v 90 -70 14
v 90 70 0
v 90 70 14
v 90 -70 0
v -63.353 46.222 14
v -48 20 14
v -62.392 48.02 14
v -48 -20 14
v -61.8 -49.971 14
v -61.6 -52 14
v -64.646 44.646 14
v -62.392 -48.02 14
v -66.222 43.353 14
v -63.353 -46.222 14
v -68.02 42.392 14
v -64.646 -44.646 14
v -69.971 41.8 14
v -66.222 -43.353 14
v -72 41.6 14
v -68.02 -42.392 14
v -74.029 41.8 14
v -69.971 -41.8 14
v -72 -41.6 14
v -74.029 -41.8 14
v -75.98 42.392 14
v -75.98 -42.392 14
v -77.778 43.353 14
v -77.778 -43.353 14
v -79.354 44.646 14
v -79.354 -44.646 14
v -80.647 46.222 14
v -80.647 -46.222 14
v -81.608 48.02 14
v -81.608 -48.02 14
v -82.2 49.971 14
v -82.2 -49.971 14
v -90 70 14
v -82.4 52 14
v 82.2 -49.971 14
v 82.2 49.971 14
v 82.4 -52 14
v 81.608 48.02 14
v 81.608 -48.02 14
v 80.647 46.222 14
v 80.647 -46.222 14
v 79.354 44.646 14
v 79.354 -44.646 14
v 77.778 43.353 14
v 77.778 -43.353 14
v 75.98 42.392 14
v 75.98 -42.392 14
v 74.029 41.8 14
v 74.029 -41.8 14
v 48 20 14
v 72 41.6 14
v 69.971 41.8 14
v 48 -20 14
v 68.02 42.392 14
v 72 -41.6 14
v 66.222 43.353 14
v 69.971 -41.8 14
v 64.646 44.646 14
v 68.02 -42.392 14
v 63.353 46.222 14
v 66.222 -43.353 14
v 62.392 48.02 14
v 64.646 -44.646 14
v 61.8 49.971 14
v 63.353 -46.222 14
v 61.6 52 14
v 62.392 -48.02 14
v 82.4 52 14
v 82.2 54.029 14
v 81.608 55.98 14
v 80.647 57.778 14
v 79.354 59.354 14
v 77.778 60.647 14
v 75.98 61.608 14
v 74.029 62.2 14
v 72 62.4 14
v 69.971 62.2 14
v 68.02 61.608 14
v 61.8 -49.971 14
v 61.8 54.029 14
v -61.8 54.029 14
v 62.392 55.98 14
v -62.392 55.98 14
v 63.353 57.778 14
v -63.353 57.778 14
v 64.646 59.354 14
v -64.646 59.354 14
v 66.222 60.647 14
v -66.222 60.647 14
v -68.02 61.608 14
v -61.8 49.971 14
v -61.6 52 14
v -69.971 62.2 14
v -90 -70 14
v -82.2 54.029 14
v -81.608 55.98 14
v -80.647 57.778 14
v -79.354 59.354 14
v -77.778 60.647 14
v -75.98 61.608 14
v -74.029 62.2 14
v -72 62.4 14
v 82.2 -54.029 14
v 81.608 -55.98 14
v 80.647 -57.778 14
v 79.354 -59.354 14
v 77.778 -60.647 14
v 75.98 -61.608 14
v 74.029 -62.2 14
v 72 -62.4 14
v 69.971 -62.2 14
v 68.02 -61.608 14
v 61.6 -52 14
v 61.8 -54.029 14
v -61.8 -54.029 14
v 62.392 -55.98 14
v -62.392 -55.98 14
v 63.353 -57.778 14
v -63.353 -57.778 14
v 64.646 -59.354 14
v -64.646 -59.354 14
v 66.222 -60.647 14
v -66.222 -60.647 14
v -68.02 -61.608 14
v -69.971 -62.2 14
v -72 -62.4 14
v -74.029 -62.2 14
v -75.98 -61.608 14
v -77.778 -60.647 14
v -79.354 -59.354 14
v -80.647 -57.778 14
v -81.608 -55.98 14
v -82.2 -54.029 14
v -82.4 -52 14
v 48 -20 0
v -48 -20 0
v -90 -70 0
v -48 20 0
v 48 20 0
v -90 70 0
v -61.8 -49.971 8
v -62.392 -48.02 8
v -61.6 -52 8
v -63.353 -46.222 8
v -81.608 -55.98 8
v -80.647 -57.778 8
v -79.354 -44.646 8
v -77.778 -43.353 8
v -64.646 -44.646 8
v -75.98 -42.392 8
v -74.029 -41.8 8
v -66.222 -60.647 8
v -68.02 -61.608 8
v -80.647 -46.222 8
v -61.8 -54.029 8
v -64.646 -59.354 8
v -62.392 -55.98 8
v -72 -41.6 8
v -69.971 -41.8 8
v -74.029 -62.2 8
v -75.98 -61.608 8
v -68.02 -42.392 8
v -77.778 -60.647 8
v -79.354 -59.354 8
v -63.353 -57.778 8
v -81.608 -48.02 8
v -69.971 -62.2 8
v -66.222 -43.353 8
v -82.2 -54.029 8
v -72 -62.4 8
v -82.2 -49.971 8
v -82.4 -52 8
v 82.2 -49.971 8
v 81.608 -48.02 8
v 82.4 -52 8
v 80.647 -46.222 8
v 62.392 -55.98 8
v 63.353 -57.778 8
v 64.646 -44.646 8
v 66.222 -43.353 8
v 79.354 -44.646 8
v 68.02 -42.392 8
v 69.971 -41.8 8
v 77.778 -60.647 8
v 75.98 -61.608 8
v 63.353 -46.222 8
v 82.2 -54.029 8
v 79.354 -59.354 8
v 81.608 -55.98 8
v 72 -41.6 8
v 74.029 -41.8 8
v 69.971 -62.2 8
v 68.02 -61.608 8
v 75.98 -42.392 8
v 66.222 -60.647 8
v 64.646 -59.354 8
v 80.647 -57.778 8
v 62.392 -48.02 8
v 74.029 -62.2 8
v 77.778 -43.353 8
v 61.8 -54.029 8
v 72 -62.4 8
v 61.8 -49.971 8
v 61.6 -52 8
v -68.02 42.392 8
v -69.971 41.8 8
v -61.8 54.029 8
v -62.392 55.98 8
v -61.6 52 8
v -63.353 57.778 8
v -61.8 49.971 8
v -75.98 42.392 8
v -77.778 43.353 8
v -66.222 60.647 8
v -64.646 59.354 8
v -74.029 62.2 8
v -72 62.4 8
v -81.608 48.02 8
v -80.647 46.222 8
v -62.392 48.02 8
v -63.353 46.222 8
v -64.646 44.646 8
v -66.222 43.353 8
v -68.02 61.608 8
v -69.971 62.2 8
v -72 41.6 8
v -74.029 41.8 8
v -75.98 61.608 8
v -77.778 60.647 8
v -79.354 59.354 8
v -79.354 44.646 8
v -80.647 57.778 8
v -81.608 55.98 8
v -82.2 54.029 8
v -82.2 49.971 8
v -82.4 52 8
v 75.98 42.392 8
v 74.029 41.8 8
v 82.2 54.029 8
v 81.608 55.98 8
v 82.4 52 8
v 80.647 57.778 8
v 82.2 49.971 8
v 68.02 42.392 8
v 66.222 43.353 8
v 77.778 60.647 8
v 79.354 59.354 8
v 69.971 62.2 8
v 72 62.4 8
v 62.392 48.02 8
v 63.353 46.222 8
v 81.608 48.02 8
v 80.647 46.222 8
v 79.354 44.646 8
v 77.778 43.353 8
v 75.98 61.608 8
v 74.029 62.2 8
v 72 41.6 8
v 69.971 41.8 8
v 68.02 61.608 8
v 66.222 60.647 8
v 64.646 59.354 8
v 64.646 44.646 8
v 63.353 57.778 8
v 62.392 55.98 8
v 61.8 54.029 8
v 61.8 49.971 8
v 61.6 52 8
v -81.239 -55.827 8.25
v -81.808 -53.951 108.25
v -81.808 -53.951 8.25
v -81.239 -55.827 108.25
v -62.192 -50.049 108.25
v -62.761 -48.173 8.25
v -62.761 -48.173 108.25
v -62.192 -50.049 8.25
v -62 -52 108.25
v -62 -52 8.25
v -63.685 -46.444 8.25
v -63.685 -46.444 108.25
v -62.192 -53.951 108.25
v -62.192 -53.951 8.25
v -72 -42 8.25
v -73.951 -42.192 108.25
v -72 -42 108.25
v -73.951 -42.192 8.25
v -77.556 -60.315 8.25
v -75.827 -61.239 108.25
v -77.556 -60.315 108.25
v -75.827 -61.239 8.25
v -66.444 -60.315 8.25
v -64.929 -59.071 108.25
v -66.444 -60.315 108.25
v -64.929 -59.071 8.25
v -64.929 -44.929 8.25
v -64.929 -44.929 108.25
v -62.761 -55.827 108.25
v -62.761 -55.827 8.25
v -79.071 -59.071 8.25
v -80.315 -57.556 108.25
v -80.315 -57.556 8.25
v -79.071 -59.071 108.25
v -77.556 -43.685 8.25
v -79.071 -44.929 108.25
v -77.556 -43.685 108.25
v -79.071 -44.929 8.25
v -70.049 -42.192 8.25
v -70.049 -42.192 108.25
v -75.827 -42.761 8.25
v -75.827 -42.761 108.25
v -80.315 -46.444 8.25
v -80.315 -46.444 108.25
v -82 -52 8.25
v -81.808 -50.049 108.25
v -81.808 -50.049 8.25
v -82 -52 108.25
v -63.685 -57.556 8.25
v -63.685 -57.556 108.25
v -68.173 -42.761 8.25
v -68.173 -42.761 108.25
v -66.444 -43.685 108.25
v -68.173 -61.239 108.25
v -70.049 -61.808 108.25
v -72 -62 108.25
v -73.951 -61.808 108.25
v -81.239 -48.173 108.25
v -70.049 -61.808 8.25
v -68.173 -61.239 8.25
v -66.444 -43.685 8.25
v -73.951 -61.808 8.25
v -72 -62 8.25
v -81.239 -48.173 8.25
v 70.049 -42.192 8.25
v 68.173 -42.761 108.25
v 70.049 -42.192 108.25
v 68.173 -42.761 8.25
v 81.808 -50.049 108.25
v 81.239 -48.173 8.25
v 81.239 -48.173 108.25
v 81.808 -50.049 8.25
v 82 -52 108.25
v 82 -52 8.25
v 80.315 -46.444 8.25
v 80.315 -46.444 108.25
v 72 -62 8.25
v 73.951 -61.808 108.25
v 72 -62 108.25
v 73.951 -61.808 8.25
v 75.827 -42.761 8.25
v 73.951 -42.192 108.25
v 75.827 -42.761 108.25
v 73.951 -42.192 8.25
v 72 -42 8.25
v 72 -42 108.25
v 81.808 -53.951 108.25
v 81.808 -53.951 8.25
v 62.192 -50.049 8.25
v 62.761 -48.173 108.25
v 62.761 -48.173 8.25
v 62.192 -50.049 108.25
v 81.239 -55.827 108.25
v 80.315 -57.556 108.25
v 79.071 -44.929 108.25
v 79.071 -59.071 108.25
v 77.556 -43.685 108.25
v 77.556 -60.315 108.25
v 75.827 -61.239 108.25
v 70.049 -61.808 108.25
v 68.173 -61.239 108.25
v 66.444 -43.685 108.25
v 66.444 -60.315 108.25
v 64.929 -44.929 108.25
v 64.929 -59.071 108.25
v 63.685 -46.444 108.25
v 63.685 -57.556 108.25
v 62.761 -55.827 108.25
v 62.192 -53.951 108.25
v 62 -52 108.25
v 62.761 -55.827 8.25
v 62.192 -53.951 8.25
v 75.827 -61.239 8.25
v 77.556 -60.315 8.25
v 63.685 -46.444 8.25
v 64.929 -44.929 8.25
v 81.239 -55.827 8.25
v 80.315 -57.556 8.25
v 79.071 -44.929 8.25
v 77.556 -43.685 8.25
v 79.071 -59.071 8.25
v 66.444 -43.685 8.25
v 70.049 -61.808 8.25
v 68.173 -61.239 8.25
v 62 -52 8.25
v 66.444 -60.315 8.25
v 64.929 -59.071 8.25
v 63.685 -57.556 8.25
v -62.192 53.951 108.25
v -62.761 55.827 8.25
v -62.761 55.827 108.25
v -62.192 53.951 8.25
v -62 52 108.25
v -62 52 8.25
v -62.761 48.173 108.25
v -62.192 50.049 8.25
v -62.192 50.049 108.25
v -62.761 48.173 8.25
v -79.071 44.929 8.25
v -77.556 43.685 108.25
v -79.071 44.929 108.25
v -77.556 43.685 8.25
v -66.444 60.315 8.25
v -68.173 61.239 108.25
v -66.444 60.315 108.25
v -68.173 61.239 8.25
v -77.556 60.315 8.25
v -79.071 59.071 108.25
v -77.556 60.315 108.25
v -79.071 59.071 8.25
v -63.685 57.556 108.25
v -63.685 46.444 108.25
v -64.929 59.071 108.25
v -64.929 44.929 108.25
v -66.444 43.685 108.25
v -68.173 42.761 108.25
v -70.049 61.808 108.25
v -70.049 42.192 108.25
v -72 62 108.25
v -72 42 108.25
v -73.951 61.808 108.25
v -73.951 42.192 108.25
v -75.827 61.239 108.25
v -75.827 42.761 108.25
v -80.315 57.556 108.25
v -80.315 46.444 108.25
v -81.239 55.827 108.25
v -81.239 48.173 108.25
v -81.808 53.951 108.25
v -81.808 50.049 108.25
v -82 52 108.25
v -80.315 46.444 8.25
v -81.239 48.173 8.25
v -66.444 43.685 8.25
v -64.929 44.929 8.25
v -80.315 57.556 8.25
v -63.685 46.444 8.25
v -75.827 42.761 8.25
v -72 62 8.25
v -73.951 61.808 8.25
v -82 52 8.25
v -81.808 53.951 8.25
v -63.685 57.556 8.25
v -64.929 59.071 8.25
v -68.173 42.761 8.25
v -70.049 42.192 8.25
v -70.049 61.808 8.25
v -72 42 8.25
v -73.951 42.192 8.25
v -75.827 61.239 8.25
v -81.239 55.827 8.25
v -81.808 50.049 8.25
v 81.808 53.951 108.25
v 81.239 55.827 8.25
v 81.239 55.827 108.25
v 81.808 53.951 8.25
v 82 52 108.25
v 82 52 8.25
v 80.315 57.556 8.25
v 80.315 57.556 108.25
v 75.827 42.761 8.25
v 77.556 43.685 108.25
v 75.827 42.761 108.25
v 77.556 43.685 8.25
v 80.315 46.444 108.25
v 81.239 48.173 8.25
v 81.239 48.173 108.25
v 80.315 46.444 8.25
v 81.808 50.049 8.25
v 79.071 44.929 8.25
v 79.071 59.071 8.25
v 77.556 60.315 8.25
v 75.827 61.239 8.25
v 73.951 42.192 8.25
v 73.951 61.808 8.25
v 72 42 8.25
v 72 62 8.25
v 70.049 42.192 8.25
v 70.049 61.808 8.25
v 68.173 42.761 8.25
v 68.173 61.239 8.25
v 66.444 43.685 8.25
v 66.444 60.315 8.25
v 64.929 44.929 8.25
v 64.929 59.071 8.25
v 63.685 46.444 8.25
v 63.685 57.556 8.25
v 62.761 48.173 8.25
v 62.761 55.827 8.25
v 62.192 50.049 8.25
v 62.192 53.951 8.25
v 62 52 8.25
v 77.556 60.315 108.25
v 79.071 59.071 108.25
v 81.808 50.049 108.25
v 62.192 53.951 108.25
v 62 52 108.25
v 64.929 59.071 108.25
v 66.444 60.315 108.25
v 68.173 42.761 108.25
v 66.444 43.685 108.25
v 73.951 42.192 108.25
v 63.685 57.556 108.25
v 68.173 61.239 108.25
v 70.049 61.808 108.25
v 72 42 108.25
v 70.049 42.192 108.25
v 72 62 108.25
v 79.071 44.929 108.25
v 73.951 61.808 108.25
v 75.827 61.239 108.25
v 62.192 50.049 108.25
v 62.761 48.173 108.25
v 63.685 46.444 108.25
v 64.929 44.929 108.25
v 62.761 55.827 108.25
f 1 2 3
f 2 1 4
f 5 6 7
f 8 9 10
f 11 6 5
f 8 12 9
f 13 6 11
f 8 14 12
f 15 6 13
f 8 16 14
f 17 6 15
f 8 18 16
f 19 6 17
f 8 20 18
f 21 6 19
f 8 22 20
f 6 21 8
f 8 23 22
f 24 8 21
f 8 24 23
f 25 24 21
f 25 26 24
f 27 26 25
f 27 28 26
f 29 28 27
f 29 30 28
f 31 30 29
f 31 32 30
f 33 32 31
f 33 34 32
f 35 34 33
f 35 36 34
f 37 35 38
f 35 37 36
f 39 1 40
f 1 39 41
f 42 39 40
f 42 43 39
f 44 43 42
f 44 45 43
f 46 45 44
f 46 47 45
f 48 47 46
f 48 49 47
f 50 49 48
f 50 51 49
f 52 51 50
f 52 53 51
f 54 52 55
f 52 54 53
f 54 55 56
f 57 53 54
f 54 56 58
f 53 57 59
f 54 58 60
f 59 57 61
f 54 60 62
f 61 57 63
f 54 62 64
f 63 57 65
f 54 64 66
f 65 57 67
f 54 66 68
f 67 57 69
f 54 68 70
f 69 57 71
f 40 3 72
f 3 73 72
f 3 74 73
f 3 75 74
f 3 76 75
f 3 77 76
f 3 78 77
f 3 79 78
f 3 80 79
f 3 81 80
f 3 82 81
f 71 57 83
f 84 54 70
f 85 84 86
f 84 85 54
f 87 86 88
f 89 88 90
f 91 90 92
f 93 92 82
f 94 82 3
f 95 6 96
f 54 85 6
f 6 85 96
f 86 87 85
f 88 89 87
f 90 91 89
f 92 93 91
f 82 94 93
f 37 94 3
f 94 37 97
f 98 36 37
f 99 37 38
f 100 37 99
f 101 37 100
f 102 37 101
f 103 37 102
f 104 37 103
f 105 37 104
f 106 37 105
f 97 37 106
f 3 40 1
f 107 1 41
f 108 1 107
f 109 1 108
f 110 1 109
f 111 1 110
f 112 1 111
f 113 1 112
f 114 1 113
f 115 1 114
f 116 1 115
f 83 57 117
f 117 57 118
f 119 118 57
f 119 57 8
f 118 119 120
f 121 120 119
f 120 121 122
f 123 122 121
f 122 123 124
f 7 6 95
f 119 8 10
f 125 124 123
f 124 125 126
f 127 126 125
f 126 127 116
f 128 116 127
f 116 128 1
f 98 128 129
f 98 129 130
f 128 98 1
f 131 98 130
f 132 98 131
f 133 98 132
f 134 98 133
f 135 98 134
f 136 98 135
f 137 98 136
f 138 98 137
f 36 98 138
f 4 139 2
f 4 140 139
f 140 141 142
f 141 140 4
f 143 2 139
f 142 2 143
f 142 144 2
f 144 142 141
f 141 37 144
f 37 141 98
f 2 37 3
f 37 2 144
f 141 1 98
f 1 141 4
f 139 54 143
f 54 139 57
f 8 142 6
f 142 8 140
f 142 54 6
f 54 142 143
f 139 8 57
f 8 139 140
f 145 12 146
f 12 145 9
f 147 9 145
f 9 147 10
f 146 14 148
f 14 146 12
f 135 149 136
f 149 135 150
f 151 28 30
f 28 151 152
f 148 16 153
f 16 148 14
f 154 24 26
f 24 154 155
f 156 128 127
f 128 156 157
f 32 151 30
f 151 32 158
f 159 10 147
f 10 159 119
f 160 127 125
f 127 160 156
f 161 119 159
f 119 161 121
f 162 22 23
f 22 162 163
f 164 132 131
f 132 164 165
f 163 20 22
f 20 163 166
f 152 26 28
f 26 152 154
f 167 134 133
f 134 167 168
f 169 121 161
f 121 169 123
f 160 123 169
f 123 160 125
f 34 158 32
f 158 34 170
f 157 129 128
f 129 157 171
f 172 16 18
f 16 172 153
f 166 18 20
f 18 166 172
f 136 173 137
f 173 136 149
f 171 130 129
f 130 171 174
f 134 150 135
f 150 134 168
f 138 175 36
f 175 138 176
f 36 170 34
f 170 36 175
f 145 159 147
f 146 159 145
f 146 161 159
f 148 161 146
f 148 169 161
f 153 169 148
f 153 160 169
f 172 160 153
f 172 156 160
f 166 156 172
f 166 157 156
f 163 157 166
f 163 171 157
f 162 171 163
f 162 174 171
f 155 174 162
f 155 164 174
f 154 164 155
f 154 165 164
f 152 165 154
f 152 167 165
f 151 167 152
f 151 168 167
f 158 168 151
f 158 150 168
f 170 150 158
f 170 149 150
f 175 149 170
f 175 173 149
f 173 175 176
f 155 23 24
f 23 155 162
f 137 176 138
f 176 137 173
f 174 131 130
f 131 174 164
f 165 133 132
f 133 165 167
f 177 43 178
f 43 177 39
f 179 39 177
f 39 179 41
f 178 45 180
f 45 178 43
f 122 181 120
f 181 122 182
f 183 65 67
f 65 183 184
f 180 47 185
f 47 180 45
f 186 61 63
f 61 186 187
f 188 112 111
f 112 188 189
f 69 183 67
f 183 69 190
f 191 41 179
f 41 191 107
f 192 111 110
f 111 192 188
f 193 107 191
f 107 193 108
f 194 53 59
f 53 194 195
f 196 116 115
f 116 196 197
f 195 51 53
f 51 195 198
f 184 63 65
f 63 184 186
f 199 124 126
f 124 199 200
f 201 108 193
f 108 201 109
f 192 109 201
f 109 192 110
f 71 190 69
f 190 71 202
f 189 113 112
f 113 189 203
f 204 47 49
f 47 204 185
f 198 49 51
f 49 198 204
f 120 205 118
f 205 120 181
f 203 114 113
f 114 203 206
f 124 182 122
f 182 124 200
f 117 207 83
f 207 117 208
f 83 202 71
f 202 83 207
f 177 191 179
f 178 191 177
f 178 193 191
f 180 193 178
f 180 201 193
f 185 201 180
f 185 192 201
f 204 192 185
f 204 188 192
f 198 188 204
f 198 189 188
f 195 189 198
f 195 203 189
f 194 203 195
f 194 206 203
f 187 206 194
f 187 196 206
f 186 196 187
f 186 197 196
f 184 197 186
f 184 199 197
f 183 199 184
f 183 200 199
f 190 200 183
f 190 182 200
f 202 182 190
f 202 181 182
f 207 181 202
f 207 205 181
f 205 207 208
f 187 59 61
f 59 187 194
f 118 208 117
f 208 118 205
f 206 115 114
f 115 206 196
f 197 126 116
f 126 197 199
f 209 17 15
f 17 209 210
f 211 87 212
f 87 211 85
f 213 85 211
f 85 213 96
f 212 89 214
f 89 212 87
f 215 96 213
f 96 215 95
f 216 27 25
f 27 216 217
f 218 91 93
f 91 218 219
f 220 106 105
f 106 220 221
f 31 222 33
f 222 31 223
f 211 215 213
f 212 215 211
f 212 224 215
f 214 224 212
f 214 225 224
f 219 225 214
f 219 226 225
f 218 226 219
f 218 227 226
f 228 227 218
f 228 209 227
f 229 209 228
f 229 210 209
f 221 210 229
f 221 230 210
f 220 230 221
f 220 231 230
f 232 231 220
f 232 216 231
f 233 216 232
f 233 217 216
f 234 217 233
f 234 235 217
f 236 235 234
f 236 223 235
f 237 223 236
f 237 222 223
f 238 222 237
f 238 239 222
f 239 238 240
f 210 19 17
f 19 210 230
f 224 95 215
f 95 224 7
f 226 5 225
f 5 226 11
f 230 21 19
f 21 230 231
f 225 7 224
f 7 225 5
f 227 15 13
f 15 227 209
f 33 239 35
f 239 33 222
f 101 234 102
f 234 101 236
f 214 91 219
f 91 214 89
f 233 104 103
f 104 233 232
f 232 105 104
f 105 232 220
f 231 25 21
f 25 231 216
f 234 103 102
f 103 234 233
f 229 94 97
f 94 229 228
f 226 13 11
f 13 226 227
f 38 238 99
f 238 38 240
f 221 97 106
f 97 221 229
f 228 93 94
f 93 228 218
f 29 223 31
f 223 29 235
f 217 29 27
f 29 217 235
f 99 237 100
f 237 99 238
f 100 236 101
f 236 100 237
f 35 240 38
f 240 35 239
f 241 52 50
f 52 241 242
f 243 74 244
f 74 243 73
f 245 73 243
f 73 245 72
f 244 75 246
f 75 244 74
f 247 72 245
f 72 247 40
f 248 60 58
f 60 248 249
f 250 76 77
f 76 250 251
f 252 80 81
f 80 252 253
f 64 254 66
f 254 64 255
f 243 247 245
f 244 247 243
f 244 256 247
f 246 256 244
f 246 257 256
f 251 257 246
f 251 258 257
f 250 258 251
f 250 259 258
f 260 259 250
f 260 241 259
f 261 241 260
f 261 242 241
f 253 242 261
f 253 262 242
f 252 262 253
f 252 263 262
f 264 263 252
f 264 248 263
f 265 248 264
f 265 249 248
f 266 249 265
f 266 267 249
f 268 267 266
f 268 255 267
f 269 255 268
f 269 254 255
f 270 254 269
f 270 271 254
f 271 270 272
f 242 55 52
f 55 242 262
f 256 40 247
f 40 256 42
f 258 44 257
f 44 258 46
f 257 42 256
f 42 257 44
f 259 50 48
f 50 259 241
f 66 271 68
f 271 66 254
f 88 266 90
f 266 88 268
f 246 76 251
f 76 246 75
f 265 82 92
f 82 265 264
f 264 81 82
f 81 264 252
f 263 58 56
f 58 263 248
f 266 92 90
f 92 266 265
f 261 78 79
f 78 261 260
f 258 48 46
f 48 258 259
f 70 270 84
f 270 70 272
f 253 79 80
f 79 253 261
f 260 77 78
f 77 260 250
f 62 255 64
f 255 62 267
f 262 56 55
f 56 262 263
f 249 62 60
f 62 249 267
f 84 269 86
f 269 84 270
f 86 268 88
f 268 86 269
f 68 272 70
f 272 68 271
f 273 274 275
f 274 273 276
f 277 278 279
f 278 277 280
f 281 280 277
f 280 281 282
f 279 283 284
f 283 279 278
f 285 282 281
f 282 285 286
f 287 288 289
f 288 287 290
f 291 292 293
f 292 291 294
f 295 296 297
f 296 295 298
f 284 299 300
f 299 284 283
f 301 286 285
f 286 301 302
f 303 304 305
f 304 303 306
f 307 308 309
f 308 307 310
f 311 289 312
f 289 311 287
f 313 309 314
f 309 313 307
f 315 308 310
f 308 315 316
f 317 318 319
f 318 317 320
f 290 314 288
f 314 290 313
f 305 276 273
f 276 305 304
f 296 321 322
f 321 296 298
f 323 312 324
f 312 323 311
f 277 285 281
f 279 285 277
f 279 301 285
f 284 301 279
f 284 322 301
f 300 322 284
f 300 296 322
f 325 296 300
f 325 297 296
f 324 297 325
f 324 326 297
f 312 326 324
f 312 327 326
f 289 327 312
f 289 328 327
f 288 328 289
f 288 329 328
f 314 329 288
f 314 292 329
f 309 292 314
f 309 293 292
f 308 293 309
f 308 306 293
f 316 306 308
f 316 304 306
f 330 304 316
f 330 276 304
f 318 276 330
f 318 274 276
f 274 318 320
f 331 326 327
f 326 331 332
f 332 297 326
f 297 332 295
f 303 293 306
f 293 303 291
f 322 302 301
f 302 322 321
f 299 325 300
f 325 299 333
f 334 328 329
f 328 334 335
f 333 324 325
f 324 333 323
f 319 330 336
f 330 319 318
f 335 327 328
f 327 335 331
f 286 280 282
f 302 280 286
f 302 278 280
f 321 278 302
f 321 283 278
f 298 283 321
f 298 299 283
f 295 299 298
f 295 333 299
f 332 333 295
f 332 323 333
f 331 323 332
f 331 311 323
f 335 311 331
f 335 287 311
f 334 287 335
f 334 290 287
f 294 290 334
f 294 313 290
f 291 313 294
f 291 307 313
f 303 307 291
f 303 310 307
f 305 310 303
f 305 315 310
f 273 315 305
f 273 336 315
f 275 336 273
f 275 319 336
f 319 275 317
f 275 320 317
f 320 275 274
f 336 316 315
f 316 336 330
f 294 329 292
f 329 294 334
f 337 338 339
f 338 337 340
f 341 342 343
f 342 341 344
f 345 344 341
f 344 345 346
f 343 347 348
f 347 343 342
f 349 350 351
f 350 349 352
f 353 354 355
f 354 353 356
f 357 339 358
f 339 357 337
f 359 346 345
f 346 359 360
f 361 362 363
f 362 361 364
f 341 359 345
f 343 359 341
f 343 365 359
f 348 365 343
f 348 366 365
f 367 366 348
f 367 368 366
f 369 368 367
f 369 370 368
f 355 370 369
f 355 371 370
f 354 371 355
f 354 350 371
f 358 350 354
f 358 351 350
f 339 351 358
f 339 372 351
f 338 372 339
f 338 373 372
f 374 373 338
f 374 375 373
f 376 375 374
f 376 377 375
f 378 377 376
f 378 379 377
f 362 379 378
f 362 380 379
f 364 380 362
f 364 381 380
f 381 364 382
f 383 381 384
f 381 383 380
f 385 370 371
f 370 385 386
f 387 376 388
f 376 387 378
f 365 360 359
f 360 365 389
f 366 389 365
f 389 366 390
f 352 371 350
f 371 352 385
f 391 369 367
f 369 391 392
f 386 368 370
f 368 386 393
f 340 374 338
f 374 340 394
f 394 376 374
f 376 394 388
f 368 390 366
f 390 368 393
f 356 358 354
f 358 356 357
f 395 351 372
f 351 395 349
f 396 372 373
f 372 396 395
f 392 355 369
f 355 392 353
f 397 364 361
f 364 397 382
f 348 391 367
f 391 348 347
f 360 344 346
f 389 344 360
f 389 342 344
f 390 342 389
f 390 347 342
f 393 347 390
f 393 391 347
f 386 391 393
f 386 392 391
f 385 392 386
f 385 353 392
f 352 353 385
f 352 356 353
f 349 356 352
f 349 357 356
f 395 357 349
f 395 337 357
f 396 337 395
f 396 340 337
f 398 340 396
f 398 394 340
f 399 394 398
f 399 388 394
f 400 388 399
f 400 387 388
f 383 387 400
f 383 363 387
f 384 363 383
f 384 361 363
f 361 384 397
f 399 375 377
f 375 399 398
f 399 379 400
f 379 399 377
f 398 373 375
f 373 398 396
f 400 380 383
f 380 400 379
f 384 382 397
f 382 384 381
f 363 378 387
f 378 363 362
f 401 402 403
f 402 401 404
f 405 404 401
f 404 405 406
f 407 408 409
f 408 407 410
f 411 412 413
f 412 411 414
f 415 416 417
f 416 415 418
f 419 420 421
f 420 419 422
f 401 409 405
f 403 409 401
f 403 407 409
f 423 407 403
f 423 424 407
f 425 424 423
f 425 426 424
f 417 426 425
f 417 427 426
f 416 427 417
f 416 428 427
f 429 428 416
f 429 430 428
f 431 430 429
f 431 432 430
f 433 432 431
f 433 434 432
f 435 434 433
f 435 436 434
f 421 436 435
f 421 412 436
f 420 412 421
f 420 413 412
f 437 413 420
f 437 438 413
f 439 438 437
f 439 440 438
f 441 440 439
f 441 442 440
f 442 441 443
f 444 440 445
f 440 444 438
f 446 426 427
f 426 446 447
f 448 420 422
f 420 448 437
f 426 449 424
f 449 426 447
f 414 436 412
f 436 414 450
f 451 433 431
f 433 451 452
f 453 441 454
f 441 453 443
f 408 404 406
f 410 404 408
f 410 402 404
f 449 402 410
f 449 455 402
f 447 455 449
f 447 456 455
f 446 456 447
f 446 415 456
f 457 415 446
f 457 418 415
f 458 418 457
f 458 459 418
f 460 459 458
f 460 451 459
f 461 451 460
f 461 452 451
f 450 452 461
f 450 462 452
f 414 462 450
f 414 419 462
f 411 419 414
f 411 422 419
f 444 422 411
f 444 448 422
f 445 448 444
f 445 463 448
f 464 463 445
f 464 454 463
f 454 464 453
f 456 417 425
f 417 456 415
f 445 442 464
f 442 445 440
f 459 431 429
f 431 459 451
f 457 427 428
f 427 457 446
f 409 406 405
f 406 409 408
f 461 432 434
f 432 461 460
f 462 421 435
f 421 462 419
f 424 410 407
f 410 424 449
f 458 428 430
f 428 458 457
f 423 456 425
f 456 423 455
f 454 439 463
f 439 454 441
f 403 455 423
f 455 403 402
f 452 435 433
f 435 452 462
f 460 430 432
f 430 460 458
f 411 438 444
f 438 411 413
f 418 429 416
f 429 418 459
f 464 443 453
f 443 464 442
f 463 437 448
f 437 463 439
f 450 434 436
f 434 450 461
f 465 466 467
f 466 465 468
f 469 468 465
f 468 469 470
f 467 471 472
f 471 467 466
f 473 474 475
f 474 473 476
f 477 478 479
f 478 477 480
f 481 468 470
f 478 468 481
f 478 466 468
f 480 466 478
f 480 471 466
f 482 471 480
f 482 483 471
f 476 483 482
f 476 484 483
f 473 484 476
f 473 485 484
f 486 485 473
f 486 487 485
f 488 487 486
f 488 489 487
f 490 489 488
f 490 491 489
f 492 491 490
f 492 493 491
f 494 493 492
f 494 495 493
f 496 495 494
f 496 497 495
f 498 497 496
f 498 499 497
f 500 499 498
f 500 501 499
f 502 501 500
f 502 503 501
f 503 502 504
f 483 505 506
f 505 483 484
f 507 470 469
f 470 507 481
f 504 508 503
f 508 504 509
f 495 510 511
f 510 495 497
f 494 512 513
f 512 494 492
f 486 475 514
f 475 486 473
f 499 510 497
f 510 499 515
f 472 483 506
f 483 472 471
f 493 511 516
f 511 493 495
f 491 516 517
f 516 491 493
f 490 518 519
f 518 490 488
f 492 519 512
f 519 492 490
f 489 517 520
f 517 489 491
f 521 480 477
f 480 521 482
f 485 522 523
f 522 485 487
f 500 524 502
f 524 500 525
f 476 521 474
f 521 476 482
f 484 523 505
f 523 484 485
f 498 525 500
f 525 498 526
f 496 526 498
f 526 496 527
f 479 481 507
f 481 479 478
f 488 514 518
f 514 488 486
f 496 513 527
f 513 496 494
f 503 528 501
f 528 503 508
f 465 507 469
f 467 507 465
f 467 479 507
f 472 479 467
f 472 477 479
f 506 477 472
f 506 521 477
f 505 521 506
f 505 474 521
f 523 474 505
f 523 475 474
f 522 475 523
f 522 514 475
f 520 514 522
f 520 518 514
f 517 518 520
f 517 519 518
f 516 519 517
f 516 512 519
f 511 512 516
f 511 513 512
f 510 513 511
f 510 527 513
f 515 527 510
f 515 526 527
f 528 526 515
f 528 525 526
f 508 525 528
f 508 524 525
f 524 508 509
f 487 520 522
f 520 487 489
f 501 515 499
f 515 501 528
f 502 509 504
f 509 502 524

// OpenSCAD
$fn = 32;

// ------------------------------------------------------------------------
// Frame with four posts: 180 x 140 mm frame, four d20 posts
// Every part is its own module, assembly() places them once.
// ------------------------------------------------------------------------

// --- part 1 ---
module base_frame() {
  difference() {
    translate([-90, -70, 0]) cube([180, 140, 14]);
    translate([-48, -20, -1]) cube([96, 40, 16]);
    translate([-72, -52, 8]) cylinder(h = 7, d = 20.8);
    translate([72, -52, 8]) cylinder(h = 7, d = 20.8);
    translate([-72, 52, 8]) cylinder(h = 7, d = 20.8);
    translate([72, 52, 8]) cylinder(h = 7, d = 20.8);
  }
}

// --- part 2 ---
module post1() {
  cylinder(h = 100, d = 20);
}

// --- part 3 ---
module post2() {
  cylinder(h = 100, d = 20);
}

// --- part 4 ---
module post3() {
  cylinder(h = 100, d = 20);
}

// --- part 5 ---
module post4() {
  cylinder(h = 100, d = 20);
}

// --- assembly ---
module assembly() {
  translate([0, 0, 0]) rotate([0, 0, 0]) base_frame();
  translate([-72, -52, 8.25]) rotate([0, 0, 0]) post1();
  translate([72, -52, 8.25]) rotate([0, 0, 0]) post2();
  translate([-72, 52, 8.25]) rotate([0, 0, 0]) post3();
  translate([72, 52, 8.25]) rotate([0, 0, 0]) post4();
}

assembly();
